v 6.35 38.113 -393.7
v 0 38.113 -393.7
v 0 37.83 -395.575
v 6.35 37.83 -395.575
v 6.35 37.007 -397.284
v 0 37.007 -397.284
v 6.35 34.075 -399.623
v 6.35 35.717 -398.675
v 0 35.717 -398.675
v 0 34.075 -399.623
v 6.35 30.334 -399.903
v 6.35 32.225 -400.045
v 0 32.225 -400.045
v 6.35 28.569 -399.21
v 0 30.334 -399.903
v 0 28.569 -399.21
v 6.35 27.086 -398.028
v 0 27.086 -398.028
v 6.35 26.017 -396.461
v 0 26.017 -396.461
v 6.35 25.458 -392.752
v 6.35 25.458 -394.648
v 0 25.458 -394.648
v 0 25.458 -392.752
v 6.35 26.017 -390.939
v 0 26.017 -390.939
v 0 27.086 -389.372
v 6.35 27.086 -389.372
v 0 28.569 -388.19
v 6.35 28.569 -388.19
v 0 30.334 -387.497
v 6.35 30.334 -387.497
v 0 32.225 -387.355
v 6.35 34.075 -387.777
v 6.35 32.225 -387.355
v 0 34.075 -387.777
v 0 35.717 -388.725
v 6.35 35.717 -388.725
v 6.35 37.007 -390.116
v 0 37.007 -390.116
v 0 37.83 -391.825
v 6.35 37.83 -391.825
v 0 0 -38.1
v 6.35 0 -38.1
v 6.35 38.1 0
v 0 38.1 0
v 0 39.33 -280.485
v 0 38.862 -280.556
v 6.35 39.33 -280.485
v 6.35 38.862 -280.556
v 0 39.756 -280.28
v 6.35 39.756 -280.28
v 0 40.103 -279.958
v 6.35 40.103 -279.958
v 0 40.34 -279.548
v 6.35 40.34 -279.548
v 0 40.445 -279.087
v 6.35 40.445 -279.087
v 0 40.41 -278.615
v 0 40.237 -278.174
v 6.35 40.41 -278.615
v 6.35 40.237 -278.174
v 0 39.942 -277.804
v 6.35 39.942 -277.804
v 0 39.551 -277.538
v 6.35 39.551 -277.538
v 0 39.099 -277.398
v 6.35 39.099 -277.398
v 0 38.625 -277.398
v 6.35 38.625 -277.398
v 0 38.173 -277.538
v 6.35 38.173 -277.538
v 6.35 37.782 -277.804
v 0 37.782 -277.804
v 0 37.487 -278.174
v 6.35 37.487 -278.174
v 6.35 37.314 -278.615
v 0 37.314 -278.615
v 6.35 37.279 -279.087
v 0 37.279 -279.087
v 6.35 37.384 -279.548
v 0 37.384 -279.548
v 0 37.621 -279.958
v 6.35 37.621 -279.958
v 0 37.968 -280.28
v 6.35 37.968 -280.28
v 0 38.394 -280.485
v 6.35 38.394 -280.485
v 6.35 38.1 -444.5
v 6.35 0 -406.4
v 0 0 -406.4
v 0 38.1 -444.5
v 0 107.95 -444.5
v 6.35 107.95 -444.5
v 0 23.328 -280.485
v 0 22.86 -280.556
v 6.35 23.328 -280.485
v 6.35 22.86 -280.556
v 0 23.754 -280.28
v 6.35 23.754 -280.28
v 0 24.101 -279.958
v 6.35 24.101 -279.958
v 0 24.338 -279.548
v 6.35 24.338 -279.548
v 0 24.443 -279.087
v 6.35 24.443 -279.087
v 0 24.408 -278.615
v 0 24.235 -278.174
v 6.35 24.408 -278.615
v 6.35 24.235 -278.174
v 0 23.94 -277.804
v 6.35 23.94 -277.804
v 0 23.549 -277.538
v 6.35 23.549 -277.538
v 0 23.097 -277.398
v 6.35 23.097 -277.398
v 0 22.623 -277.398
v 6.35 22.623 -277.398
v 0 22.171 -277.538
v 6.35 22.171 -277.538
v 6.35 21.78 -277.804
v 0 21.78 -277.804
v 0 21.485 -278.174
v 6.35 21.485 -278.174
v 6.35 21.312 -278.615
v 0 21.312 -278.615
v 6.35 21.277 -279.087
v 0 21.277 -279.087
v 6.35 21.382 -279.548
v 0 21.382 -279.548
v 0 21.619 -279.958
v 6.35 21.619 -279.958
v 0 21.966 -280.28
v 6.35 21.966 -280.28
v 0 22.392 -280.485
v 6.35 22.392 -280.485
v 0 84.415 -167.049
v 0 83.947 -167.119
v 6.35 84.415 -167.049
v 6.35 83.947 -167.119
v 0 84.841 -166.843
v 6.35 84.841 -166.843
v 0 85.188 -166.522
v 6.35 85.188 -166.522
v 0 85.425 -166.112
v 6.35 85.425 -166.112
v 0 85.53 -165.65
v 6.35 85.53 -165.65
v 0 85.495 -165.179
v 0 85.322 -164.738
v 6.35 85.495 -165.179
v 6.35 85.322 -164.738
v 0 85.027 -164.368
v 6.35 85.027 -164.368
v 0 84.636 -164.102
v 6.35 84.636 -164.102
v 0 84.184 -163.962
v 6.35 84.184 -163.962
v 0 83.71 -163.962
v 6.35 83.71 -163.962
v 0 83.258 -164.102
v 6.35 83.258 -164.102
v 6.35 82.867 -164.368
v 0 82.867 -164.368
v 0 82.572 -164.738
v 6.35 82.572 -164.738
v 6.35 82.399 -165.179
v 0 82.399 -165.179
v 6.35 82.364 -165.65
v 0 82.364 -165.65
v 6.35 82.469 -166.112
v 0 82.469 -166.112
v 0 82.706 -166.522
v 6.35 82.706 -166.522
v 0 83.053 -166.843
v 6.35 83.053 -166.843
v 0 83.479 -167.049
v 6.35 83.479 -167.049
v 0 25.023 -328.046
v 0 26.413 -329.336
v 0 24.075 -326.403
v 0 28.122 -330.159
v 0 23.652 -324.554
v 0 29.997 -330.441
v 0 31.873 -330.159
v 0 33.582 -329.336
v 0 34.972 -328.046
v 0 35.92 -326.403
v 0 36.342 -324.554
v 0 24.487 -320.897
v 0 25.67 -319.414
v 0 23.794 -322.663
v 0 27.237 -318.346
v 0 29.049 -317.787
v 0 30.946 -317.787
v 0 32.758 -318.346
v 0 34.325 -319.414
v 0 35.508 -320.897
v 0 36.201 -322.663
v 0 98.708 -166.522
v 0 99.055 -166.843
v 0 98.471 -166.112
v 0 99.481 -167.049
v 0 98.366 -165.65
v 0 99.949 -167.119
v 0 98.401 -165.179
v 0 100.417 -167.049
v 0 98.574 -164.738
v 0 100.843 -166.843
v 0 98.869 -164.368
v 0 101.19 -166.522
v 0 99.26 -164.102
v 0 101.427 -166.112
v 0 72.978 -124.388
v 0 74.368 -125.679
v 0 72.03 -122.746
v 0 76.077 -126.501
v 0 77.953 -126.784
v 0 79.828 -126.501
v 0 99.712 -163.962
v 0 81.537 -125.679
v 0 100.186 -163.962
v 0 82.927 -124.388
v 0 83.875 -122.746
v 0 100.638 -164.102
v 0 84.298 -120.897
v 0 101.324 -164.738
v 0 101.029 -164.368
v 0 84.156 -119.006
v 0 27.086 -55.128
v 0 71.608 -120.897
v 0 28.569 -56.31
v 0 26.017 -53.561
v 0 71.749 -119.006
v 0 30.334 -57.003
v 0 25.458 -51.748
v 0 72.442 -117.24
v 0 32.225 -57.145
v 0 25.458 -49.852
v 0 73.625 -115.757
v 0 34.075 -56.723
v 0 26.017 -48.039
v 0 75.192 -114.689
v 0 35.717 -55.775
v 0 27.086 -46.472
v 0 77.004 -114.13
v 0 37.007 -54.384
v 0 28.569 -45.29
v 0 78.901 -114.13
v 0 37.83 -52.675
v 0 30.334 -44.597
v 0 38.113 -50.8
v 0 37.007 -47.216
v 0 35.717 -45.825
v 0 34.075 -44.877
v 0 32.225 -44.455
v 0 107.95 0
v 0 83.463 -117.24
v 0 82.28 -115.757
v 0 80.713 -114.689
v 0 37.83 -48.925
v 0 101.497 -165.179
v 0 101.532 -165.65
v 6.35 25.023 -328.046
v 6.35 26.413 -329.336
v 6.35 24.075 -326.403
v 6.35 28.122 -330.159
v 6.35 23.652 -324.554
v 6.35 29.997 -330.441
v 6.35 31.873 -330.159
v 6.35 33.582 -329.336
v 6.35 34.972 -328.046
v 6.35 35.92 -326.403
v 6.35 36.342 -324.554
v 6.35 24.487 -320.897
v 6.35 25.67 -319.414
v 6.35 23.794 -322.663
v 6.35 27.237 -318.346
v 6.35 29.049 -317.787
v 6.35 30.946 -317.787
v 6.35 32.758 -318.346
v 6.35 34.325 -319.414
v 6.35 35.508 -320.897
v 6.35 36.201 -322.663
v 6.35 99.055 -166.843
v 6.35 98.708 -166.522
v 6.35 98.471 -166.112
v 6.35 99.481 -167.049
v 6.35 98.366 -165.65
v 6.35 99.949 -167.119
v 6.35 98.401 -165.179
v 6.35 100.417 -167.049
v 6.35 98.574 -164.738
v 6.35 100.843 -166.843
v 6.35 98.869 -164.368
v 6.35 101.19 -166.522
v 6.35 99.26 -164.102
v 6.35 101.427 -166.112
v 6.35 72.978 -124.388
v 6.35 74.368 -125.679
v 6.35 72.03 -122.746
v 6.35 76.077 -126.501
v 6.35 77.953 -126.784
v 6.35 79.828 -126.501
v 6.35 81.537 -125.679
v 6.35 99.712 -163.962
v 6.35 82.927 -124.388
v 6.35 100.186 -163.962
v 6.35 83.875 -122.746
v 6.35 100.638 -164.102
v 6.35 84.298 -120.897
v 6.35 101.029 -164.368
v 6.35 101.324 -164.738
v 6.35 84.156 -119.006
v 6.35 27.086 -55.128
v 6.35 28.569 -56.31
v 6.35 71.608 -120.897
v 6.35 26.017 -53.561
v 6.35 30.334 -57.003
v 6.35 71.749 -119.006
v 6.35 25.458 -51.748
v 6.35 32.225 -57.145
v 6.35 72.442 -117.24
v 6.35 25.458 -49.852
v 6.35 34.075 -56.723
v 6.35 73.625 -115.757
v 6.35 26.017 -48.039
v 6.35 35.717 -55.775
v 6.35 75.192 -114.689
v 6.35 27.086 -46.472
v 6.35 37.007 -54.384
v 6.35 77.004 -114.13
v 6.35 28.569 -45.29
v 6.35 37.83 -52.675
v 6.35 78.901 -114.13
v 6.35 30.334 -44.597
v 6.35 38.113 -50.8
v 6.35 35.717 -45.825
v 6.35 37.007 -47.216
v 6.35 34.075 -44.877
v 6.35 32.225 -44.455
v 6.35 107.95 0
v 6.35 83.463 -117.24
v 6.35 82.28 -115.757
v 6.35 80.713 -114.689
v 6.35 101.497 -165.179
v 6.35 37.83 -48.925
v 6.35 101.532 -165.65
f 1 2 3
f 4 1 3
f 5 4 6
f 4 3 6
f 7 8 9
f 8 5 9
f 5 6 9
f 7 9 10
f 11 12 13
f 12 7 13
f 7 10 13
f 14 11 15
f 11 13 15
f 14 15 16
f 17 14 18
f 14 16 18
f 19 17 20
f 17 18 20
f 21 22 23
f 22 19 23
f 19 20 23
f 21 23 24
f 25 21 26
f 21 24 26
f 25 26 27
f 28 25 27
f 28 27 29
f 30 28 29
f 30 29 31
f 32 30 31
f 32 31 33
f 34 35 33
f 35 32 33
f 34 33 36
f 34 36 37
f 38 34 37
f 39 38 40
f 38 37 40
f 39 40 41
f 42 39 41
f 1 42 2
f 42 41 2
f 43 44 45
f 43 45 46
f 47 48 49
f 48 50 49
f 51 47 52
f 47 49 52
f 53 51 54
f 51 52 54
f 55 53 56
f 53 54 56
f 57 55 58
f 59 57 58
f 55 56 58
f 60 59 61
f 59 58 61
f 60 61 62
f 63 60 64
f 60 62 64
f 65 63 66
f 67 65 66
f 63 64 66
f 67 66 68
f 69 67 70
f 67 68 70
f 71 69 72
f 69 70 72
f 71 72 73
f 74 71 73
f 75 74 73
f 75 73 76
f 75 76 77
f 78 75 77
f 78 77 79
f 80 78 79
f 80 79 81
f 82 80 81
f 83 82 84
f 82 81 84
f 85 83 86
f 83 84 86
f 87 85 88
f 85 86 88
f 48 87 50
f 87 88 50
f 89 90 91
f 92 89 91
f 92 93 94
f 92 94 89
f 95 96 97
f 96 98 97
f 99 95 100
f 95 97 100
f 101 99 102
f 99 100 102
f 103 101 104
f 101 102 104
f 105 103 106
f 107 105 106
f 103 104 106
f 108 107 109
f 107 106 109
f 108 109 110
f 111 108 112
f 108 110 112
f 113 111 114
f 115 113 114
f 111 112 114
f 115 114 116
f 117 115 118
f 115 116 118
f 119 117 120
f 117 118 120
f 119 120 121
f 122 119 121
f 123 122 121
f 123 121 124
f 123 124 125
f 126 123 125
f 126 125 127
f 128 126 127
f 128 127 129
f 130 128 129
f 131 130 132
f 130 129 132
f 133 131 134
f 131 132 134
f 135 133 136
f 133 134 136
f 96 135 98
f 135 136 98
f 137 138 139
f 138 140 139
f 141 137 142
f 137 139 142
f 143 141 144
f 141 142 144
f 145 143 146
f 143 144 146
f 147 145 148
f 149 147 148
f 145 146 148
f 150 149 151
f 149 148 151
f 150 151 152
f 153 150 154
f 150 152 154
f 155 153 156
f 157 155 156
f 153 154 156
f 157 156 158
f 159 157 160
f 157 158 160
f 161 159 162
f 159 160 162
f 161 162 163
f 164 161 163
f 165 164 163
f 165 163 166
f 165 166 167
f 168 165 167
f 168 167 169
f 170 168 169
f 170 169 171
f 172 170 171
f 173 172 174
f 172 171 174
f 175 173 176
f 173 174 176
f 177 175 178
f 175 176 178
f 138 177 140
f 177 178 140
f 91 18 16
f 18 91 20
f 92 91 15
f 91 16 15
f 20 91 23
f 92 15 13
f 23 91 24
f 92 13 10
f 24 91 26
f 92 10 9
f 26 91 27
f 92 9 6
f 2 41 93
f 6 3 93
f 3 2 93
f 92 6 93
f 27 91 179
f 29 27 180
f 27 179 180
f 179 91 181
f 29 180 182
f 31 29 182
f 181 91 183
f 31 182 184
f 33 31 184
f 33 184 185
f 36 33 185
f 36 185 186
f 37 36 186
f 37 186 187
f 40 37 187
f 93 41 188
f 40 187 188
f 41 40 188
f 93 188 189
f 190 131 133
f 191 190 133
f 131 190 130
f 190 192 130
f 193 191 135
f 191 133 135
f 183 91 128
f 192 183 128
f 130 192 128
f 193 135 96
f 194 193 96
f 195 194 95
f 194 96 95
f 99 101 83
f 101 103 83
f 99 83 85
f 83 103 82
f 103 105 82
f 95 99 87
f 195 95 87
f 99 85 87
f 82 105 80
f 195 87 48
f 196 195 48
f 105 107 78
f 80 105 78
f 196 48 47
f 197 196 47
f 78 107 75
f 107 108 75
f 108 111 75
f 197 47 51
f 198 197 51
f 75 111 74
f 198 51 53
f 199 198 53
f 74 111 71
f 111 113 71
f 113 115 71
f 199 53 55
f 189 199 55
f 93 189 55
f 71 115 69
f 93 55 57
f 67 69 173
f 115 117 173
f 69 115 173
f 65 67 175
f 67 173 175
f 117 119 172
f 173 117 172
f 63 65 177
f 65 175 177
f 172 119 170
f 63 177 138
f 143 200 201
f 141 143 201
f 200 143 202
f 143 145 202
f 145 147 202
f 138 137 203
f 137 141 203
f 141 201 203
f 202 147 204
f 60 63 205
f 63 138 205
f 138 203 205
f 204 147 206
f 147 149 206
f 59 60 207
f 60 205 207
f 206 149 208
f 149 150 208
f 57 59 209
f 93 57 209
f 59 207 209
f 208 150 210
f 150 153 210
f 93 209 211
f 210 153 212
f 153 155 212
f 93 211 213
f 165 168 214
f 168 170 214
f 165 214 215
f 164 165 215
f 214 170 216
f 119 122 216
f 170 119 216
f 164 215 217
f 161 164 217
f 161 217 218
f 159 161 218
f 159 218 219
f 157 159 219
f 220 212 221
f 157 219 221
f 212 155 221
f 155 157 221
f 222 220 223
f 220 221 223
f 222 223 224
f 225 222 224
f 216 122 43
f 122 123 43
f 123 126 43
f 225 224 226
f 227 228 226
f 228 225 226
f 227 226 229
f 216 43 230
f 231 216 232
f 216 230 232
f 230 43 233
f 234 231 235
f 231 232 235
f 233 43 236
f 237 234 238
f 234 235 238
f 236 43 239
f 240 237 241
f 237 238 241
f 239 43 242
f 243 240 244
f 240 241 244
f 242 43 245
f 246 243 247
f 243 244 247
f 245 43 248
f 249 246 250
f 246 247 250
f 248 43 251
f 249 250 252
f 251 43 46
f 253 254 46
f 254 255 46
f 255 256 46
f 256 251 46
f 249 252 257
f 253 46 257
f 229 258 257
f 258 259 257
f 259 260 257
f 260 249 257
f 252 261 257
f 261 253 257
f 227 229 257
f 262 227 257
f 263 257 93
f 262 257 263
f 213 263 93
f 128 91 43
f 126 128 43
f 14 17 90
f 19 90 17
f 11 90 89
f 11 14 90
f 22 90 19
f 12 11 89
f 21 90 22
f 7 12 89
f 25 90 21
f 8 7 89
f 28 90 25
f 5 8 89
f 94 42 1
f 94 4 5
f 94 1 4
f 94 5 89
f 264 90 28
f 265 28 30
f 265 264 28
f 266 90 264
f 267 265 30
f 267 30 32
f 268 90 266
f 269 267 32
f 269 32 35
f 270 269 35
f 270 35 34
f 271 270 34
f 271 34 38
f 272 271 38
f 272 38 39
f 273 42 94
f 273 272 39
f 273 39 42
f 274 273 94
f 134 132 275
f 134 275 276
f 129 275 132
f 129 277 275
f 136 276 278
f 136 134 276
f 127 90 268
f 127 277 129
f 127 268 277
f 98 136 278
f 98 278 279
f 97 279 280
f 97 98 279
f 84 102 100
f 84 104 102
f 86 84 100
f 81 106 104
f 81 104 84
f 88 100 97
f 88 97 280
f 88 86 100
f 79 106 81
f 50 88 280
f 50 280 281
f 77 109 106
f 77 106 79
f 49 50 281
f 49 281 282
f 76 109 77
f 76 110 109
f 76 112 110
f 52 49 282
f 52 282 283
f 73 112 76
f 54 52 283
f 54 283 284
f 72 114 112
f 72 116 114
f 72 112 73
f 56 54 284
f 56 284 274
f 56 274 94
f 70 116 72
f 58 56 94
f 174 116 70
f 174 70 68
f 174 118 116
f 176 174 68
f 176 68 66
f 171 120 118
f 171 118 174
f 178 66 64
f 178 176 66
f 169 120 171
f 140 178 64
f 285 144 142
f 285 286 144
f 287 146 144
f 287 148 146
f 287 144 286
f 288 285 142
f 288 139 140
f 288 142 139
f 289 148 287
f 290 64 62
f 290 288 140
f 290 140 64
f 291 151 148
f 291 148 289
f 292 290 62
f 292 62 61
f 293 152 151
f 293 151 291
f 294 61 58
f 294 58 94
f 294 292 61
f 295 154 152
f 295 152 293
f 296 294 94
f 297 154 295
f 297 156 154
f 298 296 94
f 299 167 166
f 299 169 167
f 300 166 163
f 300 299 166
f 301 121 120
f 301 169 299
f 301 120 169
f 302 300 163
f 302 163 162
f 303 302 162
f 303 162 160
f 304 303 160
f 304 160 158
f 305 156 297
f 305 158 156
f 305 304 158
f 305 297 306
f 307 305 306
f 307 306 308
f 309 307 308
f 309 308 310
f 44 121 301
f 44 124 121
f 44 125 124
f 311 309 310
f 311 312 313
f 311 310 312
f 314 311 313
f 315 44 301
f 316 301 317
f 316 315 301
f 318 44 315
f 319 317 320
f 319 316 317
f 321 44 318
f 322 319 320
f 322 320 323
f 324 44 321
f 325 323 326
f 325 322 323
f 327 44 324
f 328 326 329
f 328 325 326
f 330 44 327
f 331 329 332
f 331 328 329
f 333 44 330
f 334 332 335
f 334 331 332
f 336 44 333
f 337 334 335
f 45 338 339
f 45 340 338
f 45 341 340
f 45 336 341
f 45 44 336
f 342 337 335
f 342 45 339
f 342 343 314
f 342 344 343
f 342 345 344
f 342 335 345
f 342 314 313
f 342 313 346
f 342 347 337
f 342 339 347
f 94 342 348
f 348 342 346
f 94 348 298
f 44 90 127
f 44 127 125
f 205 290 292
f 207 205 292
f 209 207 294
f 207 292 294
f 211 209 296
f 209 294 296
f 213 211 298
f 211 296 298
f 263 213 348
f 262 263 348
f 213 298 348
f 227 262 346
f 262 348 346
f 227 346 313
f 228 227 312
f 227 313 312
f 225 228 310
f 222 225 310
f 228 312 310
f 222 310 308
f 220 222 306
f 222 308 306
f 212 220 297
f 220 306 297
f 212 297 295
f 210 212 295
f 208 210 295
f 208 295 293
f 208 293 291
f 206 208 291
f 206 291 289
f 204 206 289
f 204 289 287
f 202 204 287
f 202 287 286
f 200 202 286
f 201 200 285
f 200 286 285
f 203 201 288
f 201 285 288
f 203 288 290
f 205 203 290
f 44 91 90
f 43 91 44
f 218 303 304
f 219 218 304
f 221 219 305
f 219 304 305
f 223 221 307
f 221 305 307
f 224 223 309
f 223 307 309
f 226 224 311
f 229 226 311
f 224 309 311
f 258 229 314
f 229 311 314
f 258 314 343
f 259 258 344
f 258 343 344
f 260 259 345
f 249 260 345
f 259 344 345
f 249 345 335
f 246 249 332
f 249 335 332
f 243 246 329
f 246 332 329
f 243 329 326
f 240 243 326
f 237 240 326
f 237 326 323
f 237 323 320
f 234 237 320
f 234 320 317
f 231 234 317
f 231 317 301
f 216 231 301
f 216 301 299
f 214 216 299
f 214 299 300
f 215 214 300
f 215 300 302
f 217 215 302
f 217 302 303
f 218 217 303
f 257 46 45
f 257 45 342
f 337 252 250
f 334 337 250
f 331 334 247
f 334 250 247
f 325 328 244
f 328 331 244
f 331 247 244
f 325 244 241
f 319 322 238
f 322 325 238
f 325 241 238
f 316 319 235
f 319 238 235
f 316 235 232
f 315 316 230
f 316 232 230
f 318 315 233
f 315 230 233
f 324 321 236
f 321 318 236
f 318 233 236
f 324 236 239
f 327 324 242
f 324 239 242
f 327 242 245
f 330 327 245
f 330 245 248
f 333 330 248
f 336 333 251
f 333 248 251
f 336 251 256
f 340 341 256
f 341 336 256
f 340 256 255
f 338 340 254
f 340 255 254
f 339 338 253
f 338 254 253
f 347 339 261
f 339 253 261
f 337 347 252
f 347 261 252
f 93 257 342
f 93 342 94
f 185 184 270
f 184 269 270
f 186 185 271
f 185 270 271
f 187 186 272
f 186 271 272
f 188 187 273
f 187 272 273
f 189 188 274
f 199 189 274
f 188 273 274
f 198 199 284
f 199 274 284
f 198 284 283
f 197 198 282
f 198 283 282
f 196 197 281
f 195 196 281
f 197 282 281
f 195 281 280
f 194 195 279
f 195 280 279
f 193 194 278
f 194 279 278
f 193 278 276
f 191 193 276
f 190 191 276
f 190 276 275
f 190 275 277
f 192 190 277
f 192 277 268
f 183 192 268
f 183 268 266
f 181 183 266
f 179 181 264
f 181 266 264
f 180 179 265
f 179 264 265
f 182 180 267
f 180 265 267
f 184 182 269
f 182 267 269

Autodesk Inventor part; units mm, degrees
ref_plane "YZ Plane" through (0, 0, 0) normal (1, 0, 0) x (0, 1, 0)
ref_plane "XZ Plane" through (0, 0, 0) normal (0, 1, 0) x (-1, 0, 0)
ref_plane "XY Plane" through (0, 0, 0) normal (0, 0, 1) x (1, 0, 0)
sketch "Sketch1" plane through (0, 0, 0) normal (1, 0, 0) x (0, 1, 0)
  line L0 (0, 0) -> (107.95, 0)
  line L1 (107.95, 0) -> (107.95, -444.5)
  line L2 (107.95, -444.5) -> (0, -444.5)
  line L3 (0, -444.5) -> (0, 0)
  circle A0 centre (31.75, -50.8) radius 6.3627
  circle A1 centre (31.75, -393.7) radius 6.3627
  circle A2 centre (92.6338, -165.5318) radius 1.5875
  circle A3 centre (76.6318, -165.5318) radius 1.5875
  circle A4 centre (15.3162, -278.9682) radius 1.5875
  circle A5 centre (31.3182, -278.9682) radius 1.5875
  dimension "d0" = 107.95
  dimension "d1" = 444.5
  dimension "d2" = 12.7254
  dimension "d3" = 31.75
  dimension "d4" = 50.8
  dimension "d5" = 50.8
  dimension "d22" = 165.5318
  dimension "d23" = 3.175
  dimension "d24" = 15.3162
  dimension "d25" = 3.175
  dimension "d26" = 16.002
  dimension "d27" = 165.5318
  dimension "d28" = 3.175
  dimension "d29" = 15.3162
  dimension "d30" = 165.5318
  dimension "d31" = 3.175
  dimension "d32" = 16.002
  dimension "d33" = 165.5318
extrude "Extrusion1" add sketch "Sketch1" along normal blind 6.35 contours L0 L1 L2 L3 | A2 | A3 | A4 | A5
chamfer "Chamfer1" distance 38.1 angle 45 1 edges at (3.175, 0, 0)
chamfer "Chamfer2" distance 38.1 angle 45 1 edges at (3.175, 0, -444.5)
sketch "Sketch2" plane through (6.35, 0, 0) normal (1, 0, 0) x (0, 0, -1)
  line L0 (444.5, 38.1) -> (406.4, 0) projected
  line L1 (444.5, 38.1) -> (444.5, 107.95) projected
  line L2 (444.5, 107.95) -> (0, 107.95) projected
  line L3 (0, 107.95) -> (0, 38.1) projected
  line L4 (38.1, 0) -> (0, 38.1) projected
  line L5 (38.1, 0) -> (406.4, 0) projected
  circle A0 centre (393.7, 31.75) radius 6.3627 projected
  circle A1 centre (50.8, 31.75) radius 6.3627 projected
  circle A2 centre (120.4214, 77.9526) radius 6.3627
  circle A3 centre (324.0786, 29.9974) radius 6.3627
  point P0 (0, 0)
  dimension "d14" = 12.7254
  dimension "d15" = 120.4214
  dimension "d16" = 29.9974
  dimension "d17" = 12.7254
  dimension "d18" = 29.9974
  dimension "d19" = 120.4214
extrude "Extrusion2" cut sketch "Sketch2" against normal blind 25.4 contours A2 | A3
sketch "Sketch3" plane through (6.35, 0, 0) normal (1, 0, 0) x (0, 0, -1)
  circle A0 centre (120.4214, 77.9526) radius 6.3627 projected
  circle A1 centre (324.0786, 29.9974) radius 6.3627 projected
  line L0 (444.5, 38.1) -> (406.4, 0) projected
  line L1 (444.5, 38.1) -> (444.5, 107.95) projected
  line L2 (444.5, 107.95) -> (0, 107.95) projected
  line L3 (0, 107.95) -> (0, 38.1) projected
  line L4 (38.1, 0) -> (0, 38.1) projected
  line L5 (38.1, 0) -> (406.4, 0) projected
  circle A2 centre (393.7, 31.75) radius 6.3627 projected
  circle A3 centre (50.8, 31.75) radius 6.3627 projected
  circle A4 centre (165.5318, 99.949) radius 1.5875
  circle A5 centre (165.5318, 83.947) radius 1.5875
  circle A6 centre (278.9682, 22.86) radius 1.5875
  circle A7 centre (278.9682, 38.862) radius 1.5875
  point P0 (0, 0)
  dimension "d34" = 3.175
  dimension "d35" = 165.5318
  dimension "d36" = 8.001
  dimension "d37" = 3.175
  dimension "d38" = 16.002
  dimension "d39" = 3.175
  dimension "d40" = 3.175
  dimension "d41" = 22.86
  dimension "d42" = 16.002
  dimension "d43" = 165.5318
extrude "Extrusion3" cut sketch "Sketch3" against normal blind 25.4 contours A4 | A5 | A6 | A7
properties part number "DriveTrain3.0"
